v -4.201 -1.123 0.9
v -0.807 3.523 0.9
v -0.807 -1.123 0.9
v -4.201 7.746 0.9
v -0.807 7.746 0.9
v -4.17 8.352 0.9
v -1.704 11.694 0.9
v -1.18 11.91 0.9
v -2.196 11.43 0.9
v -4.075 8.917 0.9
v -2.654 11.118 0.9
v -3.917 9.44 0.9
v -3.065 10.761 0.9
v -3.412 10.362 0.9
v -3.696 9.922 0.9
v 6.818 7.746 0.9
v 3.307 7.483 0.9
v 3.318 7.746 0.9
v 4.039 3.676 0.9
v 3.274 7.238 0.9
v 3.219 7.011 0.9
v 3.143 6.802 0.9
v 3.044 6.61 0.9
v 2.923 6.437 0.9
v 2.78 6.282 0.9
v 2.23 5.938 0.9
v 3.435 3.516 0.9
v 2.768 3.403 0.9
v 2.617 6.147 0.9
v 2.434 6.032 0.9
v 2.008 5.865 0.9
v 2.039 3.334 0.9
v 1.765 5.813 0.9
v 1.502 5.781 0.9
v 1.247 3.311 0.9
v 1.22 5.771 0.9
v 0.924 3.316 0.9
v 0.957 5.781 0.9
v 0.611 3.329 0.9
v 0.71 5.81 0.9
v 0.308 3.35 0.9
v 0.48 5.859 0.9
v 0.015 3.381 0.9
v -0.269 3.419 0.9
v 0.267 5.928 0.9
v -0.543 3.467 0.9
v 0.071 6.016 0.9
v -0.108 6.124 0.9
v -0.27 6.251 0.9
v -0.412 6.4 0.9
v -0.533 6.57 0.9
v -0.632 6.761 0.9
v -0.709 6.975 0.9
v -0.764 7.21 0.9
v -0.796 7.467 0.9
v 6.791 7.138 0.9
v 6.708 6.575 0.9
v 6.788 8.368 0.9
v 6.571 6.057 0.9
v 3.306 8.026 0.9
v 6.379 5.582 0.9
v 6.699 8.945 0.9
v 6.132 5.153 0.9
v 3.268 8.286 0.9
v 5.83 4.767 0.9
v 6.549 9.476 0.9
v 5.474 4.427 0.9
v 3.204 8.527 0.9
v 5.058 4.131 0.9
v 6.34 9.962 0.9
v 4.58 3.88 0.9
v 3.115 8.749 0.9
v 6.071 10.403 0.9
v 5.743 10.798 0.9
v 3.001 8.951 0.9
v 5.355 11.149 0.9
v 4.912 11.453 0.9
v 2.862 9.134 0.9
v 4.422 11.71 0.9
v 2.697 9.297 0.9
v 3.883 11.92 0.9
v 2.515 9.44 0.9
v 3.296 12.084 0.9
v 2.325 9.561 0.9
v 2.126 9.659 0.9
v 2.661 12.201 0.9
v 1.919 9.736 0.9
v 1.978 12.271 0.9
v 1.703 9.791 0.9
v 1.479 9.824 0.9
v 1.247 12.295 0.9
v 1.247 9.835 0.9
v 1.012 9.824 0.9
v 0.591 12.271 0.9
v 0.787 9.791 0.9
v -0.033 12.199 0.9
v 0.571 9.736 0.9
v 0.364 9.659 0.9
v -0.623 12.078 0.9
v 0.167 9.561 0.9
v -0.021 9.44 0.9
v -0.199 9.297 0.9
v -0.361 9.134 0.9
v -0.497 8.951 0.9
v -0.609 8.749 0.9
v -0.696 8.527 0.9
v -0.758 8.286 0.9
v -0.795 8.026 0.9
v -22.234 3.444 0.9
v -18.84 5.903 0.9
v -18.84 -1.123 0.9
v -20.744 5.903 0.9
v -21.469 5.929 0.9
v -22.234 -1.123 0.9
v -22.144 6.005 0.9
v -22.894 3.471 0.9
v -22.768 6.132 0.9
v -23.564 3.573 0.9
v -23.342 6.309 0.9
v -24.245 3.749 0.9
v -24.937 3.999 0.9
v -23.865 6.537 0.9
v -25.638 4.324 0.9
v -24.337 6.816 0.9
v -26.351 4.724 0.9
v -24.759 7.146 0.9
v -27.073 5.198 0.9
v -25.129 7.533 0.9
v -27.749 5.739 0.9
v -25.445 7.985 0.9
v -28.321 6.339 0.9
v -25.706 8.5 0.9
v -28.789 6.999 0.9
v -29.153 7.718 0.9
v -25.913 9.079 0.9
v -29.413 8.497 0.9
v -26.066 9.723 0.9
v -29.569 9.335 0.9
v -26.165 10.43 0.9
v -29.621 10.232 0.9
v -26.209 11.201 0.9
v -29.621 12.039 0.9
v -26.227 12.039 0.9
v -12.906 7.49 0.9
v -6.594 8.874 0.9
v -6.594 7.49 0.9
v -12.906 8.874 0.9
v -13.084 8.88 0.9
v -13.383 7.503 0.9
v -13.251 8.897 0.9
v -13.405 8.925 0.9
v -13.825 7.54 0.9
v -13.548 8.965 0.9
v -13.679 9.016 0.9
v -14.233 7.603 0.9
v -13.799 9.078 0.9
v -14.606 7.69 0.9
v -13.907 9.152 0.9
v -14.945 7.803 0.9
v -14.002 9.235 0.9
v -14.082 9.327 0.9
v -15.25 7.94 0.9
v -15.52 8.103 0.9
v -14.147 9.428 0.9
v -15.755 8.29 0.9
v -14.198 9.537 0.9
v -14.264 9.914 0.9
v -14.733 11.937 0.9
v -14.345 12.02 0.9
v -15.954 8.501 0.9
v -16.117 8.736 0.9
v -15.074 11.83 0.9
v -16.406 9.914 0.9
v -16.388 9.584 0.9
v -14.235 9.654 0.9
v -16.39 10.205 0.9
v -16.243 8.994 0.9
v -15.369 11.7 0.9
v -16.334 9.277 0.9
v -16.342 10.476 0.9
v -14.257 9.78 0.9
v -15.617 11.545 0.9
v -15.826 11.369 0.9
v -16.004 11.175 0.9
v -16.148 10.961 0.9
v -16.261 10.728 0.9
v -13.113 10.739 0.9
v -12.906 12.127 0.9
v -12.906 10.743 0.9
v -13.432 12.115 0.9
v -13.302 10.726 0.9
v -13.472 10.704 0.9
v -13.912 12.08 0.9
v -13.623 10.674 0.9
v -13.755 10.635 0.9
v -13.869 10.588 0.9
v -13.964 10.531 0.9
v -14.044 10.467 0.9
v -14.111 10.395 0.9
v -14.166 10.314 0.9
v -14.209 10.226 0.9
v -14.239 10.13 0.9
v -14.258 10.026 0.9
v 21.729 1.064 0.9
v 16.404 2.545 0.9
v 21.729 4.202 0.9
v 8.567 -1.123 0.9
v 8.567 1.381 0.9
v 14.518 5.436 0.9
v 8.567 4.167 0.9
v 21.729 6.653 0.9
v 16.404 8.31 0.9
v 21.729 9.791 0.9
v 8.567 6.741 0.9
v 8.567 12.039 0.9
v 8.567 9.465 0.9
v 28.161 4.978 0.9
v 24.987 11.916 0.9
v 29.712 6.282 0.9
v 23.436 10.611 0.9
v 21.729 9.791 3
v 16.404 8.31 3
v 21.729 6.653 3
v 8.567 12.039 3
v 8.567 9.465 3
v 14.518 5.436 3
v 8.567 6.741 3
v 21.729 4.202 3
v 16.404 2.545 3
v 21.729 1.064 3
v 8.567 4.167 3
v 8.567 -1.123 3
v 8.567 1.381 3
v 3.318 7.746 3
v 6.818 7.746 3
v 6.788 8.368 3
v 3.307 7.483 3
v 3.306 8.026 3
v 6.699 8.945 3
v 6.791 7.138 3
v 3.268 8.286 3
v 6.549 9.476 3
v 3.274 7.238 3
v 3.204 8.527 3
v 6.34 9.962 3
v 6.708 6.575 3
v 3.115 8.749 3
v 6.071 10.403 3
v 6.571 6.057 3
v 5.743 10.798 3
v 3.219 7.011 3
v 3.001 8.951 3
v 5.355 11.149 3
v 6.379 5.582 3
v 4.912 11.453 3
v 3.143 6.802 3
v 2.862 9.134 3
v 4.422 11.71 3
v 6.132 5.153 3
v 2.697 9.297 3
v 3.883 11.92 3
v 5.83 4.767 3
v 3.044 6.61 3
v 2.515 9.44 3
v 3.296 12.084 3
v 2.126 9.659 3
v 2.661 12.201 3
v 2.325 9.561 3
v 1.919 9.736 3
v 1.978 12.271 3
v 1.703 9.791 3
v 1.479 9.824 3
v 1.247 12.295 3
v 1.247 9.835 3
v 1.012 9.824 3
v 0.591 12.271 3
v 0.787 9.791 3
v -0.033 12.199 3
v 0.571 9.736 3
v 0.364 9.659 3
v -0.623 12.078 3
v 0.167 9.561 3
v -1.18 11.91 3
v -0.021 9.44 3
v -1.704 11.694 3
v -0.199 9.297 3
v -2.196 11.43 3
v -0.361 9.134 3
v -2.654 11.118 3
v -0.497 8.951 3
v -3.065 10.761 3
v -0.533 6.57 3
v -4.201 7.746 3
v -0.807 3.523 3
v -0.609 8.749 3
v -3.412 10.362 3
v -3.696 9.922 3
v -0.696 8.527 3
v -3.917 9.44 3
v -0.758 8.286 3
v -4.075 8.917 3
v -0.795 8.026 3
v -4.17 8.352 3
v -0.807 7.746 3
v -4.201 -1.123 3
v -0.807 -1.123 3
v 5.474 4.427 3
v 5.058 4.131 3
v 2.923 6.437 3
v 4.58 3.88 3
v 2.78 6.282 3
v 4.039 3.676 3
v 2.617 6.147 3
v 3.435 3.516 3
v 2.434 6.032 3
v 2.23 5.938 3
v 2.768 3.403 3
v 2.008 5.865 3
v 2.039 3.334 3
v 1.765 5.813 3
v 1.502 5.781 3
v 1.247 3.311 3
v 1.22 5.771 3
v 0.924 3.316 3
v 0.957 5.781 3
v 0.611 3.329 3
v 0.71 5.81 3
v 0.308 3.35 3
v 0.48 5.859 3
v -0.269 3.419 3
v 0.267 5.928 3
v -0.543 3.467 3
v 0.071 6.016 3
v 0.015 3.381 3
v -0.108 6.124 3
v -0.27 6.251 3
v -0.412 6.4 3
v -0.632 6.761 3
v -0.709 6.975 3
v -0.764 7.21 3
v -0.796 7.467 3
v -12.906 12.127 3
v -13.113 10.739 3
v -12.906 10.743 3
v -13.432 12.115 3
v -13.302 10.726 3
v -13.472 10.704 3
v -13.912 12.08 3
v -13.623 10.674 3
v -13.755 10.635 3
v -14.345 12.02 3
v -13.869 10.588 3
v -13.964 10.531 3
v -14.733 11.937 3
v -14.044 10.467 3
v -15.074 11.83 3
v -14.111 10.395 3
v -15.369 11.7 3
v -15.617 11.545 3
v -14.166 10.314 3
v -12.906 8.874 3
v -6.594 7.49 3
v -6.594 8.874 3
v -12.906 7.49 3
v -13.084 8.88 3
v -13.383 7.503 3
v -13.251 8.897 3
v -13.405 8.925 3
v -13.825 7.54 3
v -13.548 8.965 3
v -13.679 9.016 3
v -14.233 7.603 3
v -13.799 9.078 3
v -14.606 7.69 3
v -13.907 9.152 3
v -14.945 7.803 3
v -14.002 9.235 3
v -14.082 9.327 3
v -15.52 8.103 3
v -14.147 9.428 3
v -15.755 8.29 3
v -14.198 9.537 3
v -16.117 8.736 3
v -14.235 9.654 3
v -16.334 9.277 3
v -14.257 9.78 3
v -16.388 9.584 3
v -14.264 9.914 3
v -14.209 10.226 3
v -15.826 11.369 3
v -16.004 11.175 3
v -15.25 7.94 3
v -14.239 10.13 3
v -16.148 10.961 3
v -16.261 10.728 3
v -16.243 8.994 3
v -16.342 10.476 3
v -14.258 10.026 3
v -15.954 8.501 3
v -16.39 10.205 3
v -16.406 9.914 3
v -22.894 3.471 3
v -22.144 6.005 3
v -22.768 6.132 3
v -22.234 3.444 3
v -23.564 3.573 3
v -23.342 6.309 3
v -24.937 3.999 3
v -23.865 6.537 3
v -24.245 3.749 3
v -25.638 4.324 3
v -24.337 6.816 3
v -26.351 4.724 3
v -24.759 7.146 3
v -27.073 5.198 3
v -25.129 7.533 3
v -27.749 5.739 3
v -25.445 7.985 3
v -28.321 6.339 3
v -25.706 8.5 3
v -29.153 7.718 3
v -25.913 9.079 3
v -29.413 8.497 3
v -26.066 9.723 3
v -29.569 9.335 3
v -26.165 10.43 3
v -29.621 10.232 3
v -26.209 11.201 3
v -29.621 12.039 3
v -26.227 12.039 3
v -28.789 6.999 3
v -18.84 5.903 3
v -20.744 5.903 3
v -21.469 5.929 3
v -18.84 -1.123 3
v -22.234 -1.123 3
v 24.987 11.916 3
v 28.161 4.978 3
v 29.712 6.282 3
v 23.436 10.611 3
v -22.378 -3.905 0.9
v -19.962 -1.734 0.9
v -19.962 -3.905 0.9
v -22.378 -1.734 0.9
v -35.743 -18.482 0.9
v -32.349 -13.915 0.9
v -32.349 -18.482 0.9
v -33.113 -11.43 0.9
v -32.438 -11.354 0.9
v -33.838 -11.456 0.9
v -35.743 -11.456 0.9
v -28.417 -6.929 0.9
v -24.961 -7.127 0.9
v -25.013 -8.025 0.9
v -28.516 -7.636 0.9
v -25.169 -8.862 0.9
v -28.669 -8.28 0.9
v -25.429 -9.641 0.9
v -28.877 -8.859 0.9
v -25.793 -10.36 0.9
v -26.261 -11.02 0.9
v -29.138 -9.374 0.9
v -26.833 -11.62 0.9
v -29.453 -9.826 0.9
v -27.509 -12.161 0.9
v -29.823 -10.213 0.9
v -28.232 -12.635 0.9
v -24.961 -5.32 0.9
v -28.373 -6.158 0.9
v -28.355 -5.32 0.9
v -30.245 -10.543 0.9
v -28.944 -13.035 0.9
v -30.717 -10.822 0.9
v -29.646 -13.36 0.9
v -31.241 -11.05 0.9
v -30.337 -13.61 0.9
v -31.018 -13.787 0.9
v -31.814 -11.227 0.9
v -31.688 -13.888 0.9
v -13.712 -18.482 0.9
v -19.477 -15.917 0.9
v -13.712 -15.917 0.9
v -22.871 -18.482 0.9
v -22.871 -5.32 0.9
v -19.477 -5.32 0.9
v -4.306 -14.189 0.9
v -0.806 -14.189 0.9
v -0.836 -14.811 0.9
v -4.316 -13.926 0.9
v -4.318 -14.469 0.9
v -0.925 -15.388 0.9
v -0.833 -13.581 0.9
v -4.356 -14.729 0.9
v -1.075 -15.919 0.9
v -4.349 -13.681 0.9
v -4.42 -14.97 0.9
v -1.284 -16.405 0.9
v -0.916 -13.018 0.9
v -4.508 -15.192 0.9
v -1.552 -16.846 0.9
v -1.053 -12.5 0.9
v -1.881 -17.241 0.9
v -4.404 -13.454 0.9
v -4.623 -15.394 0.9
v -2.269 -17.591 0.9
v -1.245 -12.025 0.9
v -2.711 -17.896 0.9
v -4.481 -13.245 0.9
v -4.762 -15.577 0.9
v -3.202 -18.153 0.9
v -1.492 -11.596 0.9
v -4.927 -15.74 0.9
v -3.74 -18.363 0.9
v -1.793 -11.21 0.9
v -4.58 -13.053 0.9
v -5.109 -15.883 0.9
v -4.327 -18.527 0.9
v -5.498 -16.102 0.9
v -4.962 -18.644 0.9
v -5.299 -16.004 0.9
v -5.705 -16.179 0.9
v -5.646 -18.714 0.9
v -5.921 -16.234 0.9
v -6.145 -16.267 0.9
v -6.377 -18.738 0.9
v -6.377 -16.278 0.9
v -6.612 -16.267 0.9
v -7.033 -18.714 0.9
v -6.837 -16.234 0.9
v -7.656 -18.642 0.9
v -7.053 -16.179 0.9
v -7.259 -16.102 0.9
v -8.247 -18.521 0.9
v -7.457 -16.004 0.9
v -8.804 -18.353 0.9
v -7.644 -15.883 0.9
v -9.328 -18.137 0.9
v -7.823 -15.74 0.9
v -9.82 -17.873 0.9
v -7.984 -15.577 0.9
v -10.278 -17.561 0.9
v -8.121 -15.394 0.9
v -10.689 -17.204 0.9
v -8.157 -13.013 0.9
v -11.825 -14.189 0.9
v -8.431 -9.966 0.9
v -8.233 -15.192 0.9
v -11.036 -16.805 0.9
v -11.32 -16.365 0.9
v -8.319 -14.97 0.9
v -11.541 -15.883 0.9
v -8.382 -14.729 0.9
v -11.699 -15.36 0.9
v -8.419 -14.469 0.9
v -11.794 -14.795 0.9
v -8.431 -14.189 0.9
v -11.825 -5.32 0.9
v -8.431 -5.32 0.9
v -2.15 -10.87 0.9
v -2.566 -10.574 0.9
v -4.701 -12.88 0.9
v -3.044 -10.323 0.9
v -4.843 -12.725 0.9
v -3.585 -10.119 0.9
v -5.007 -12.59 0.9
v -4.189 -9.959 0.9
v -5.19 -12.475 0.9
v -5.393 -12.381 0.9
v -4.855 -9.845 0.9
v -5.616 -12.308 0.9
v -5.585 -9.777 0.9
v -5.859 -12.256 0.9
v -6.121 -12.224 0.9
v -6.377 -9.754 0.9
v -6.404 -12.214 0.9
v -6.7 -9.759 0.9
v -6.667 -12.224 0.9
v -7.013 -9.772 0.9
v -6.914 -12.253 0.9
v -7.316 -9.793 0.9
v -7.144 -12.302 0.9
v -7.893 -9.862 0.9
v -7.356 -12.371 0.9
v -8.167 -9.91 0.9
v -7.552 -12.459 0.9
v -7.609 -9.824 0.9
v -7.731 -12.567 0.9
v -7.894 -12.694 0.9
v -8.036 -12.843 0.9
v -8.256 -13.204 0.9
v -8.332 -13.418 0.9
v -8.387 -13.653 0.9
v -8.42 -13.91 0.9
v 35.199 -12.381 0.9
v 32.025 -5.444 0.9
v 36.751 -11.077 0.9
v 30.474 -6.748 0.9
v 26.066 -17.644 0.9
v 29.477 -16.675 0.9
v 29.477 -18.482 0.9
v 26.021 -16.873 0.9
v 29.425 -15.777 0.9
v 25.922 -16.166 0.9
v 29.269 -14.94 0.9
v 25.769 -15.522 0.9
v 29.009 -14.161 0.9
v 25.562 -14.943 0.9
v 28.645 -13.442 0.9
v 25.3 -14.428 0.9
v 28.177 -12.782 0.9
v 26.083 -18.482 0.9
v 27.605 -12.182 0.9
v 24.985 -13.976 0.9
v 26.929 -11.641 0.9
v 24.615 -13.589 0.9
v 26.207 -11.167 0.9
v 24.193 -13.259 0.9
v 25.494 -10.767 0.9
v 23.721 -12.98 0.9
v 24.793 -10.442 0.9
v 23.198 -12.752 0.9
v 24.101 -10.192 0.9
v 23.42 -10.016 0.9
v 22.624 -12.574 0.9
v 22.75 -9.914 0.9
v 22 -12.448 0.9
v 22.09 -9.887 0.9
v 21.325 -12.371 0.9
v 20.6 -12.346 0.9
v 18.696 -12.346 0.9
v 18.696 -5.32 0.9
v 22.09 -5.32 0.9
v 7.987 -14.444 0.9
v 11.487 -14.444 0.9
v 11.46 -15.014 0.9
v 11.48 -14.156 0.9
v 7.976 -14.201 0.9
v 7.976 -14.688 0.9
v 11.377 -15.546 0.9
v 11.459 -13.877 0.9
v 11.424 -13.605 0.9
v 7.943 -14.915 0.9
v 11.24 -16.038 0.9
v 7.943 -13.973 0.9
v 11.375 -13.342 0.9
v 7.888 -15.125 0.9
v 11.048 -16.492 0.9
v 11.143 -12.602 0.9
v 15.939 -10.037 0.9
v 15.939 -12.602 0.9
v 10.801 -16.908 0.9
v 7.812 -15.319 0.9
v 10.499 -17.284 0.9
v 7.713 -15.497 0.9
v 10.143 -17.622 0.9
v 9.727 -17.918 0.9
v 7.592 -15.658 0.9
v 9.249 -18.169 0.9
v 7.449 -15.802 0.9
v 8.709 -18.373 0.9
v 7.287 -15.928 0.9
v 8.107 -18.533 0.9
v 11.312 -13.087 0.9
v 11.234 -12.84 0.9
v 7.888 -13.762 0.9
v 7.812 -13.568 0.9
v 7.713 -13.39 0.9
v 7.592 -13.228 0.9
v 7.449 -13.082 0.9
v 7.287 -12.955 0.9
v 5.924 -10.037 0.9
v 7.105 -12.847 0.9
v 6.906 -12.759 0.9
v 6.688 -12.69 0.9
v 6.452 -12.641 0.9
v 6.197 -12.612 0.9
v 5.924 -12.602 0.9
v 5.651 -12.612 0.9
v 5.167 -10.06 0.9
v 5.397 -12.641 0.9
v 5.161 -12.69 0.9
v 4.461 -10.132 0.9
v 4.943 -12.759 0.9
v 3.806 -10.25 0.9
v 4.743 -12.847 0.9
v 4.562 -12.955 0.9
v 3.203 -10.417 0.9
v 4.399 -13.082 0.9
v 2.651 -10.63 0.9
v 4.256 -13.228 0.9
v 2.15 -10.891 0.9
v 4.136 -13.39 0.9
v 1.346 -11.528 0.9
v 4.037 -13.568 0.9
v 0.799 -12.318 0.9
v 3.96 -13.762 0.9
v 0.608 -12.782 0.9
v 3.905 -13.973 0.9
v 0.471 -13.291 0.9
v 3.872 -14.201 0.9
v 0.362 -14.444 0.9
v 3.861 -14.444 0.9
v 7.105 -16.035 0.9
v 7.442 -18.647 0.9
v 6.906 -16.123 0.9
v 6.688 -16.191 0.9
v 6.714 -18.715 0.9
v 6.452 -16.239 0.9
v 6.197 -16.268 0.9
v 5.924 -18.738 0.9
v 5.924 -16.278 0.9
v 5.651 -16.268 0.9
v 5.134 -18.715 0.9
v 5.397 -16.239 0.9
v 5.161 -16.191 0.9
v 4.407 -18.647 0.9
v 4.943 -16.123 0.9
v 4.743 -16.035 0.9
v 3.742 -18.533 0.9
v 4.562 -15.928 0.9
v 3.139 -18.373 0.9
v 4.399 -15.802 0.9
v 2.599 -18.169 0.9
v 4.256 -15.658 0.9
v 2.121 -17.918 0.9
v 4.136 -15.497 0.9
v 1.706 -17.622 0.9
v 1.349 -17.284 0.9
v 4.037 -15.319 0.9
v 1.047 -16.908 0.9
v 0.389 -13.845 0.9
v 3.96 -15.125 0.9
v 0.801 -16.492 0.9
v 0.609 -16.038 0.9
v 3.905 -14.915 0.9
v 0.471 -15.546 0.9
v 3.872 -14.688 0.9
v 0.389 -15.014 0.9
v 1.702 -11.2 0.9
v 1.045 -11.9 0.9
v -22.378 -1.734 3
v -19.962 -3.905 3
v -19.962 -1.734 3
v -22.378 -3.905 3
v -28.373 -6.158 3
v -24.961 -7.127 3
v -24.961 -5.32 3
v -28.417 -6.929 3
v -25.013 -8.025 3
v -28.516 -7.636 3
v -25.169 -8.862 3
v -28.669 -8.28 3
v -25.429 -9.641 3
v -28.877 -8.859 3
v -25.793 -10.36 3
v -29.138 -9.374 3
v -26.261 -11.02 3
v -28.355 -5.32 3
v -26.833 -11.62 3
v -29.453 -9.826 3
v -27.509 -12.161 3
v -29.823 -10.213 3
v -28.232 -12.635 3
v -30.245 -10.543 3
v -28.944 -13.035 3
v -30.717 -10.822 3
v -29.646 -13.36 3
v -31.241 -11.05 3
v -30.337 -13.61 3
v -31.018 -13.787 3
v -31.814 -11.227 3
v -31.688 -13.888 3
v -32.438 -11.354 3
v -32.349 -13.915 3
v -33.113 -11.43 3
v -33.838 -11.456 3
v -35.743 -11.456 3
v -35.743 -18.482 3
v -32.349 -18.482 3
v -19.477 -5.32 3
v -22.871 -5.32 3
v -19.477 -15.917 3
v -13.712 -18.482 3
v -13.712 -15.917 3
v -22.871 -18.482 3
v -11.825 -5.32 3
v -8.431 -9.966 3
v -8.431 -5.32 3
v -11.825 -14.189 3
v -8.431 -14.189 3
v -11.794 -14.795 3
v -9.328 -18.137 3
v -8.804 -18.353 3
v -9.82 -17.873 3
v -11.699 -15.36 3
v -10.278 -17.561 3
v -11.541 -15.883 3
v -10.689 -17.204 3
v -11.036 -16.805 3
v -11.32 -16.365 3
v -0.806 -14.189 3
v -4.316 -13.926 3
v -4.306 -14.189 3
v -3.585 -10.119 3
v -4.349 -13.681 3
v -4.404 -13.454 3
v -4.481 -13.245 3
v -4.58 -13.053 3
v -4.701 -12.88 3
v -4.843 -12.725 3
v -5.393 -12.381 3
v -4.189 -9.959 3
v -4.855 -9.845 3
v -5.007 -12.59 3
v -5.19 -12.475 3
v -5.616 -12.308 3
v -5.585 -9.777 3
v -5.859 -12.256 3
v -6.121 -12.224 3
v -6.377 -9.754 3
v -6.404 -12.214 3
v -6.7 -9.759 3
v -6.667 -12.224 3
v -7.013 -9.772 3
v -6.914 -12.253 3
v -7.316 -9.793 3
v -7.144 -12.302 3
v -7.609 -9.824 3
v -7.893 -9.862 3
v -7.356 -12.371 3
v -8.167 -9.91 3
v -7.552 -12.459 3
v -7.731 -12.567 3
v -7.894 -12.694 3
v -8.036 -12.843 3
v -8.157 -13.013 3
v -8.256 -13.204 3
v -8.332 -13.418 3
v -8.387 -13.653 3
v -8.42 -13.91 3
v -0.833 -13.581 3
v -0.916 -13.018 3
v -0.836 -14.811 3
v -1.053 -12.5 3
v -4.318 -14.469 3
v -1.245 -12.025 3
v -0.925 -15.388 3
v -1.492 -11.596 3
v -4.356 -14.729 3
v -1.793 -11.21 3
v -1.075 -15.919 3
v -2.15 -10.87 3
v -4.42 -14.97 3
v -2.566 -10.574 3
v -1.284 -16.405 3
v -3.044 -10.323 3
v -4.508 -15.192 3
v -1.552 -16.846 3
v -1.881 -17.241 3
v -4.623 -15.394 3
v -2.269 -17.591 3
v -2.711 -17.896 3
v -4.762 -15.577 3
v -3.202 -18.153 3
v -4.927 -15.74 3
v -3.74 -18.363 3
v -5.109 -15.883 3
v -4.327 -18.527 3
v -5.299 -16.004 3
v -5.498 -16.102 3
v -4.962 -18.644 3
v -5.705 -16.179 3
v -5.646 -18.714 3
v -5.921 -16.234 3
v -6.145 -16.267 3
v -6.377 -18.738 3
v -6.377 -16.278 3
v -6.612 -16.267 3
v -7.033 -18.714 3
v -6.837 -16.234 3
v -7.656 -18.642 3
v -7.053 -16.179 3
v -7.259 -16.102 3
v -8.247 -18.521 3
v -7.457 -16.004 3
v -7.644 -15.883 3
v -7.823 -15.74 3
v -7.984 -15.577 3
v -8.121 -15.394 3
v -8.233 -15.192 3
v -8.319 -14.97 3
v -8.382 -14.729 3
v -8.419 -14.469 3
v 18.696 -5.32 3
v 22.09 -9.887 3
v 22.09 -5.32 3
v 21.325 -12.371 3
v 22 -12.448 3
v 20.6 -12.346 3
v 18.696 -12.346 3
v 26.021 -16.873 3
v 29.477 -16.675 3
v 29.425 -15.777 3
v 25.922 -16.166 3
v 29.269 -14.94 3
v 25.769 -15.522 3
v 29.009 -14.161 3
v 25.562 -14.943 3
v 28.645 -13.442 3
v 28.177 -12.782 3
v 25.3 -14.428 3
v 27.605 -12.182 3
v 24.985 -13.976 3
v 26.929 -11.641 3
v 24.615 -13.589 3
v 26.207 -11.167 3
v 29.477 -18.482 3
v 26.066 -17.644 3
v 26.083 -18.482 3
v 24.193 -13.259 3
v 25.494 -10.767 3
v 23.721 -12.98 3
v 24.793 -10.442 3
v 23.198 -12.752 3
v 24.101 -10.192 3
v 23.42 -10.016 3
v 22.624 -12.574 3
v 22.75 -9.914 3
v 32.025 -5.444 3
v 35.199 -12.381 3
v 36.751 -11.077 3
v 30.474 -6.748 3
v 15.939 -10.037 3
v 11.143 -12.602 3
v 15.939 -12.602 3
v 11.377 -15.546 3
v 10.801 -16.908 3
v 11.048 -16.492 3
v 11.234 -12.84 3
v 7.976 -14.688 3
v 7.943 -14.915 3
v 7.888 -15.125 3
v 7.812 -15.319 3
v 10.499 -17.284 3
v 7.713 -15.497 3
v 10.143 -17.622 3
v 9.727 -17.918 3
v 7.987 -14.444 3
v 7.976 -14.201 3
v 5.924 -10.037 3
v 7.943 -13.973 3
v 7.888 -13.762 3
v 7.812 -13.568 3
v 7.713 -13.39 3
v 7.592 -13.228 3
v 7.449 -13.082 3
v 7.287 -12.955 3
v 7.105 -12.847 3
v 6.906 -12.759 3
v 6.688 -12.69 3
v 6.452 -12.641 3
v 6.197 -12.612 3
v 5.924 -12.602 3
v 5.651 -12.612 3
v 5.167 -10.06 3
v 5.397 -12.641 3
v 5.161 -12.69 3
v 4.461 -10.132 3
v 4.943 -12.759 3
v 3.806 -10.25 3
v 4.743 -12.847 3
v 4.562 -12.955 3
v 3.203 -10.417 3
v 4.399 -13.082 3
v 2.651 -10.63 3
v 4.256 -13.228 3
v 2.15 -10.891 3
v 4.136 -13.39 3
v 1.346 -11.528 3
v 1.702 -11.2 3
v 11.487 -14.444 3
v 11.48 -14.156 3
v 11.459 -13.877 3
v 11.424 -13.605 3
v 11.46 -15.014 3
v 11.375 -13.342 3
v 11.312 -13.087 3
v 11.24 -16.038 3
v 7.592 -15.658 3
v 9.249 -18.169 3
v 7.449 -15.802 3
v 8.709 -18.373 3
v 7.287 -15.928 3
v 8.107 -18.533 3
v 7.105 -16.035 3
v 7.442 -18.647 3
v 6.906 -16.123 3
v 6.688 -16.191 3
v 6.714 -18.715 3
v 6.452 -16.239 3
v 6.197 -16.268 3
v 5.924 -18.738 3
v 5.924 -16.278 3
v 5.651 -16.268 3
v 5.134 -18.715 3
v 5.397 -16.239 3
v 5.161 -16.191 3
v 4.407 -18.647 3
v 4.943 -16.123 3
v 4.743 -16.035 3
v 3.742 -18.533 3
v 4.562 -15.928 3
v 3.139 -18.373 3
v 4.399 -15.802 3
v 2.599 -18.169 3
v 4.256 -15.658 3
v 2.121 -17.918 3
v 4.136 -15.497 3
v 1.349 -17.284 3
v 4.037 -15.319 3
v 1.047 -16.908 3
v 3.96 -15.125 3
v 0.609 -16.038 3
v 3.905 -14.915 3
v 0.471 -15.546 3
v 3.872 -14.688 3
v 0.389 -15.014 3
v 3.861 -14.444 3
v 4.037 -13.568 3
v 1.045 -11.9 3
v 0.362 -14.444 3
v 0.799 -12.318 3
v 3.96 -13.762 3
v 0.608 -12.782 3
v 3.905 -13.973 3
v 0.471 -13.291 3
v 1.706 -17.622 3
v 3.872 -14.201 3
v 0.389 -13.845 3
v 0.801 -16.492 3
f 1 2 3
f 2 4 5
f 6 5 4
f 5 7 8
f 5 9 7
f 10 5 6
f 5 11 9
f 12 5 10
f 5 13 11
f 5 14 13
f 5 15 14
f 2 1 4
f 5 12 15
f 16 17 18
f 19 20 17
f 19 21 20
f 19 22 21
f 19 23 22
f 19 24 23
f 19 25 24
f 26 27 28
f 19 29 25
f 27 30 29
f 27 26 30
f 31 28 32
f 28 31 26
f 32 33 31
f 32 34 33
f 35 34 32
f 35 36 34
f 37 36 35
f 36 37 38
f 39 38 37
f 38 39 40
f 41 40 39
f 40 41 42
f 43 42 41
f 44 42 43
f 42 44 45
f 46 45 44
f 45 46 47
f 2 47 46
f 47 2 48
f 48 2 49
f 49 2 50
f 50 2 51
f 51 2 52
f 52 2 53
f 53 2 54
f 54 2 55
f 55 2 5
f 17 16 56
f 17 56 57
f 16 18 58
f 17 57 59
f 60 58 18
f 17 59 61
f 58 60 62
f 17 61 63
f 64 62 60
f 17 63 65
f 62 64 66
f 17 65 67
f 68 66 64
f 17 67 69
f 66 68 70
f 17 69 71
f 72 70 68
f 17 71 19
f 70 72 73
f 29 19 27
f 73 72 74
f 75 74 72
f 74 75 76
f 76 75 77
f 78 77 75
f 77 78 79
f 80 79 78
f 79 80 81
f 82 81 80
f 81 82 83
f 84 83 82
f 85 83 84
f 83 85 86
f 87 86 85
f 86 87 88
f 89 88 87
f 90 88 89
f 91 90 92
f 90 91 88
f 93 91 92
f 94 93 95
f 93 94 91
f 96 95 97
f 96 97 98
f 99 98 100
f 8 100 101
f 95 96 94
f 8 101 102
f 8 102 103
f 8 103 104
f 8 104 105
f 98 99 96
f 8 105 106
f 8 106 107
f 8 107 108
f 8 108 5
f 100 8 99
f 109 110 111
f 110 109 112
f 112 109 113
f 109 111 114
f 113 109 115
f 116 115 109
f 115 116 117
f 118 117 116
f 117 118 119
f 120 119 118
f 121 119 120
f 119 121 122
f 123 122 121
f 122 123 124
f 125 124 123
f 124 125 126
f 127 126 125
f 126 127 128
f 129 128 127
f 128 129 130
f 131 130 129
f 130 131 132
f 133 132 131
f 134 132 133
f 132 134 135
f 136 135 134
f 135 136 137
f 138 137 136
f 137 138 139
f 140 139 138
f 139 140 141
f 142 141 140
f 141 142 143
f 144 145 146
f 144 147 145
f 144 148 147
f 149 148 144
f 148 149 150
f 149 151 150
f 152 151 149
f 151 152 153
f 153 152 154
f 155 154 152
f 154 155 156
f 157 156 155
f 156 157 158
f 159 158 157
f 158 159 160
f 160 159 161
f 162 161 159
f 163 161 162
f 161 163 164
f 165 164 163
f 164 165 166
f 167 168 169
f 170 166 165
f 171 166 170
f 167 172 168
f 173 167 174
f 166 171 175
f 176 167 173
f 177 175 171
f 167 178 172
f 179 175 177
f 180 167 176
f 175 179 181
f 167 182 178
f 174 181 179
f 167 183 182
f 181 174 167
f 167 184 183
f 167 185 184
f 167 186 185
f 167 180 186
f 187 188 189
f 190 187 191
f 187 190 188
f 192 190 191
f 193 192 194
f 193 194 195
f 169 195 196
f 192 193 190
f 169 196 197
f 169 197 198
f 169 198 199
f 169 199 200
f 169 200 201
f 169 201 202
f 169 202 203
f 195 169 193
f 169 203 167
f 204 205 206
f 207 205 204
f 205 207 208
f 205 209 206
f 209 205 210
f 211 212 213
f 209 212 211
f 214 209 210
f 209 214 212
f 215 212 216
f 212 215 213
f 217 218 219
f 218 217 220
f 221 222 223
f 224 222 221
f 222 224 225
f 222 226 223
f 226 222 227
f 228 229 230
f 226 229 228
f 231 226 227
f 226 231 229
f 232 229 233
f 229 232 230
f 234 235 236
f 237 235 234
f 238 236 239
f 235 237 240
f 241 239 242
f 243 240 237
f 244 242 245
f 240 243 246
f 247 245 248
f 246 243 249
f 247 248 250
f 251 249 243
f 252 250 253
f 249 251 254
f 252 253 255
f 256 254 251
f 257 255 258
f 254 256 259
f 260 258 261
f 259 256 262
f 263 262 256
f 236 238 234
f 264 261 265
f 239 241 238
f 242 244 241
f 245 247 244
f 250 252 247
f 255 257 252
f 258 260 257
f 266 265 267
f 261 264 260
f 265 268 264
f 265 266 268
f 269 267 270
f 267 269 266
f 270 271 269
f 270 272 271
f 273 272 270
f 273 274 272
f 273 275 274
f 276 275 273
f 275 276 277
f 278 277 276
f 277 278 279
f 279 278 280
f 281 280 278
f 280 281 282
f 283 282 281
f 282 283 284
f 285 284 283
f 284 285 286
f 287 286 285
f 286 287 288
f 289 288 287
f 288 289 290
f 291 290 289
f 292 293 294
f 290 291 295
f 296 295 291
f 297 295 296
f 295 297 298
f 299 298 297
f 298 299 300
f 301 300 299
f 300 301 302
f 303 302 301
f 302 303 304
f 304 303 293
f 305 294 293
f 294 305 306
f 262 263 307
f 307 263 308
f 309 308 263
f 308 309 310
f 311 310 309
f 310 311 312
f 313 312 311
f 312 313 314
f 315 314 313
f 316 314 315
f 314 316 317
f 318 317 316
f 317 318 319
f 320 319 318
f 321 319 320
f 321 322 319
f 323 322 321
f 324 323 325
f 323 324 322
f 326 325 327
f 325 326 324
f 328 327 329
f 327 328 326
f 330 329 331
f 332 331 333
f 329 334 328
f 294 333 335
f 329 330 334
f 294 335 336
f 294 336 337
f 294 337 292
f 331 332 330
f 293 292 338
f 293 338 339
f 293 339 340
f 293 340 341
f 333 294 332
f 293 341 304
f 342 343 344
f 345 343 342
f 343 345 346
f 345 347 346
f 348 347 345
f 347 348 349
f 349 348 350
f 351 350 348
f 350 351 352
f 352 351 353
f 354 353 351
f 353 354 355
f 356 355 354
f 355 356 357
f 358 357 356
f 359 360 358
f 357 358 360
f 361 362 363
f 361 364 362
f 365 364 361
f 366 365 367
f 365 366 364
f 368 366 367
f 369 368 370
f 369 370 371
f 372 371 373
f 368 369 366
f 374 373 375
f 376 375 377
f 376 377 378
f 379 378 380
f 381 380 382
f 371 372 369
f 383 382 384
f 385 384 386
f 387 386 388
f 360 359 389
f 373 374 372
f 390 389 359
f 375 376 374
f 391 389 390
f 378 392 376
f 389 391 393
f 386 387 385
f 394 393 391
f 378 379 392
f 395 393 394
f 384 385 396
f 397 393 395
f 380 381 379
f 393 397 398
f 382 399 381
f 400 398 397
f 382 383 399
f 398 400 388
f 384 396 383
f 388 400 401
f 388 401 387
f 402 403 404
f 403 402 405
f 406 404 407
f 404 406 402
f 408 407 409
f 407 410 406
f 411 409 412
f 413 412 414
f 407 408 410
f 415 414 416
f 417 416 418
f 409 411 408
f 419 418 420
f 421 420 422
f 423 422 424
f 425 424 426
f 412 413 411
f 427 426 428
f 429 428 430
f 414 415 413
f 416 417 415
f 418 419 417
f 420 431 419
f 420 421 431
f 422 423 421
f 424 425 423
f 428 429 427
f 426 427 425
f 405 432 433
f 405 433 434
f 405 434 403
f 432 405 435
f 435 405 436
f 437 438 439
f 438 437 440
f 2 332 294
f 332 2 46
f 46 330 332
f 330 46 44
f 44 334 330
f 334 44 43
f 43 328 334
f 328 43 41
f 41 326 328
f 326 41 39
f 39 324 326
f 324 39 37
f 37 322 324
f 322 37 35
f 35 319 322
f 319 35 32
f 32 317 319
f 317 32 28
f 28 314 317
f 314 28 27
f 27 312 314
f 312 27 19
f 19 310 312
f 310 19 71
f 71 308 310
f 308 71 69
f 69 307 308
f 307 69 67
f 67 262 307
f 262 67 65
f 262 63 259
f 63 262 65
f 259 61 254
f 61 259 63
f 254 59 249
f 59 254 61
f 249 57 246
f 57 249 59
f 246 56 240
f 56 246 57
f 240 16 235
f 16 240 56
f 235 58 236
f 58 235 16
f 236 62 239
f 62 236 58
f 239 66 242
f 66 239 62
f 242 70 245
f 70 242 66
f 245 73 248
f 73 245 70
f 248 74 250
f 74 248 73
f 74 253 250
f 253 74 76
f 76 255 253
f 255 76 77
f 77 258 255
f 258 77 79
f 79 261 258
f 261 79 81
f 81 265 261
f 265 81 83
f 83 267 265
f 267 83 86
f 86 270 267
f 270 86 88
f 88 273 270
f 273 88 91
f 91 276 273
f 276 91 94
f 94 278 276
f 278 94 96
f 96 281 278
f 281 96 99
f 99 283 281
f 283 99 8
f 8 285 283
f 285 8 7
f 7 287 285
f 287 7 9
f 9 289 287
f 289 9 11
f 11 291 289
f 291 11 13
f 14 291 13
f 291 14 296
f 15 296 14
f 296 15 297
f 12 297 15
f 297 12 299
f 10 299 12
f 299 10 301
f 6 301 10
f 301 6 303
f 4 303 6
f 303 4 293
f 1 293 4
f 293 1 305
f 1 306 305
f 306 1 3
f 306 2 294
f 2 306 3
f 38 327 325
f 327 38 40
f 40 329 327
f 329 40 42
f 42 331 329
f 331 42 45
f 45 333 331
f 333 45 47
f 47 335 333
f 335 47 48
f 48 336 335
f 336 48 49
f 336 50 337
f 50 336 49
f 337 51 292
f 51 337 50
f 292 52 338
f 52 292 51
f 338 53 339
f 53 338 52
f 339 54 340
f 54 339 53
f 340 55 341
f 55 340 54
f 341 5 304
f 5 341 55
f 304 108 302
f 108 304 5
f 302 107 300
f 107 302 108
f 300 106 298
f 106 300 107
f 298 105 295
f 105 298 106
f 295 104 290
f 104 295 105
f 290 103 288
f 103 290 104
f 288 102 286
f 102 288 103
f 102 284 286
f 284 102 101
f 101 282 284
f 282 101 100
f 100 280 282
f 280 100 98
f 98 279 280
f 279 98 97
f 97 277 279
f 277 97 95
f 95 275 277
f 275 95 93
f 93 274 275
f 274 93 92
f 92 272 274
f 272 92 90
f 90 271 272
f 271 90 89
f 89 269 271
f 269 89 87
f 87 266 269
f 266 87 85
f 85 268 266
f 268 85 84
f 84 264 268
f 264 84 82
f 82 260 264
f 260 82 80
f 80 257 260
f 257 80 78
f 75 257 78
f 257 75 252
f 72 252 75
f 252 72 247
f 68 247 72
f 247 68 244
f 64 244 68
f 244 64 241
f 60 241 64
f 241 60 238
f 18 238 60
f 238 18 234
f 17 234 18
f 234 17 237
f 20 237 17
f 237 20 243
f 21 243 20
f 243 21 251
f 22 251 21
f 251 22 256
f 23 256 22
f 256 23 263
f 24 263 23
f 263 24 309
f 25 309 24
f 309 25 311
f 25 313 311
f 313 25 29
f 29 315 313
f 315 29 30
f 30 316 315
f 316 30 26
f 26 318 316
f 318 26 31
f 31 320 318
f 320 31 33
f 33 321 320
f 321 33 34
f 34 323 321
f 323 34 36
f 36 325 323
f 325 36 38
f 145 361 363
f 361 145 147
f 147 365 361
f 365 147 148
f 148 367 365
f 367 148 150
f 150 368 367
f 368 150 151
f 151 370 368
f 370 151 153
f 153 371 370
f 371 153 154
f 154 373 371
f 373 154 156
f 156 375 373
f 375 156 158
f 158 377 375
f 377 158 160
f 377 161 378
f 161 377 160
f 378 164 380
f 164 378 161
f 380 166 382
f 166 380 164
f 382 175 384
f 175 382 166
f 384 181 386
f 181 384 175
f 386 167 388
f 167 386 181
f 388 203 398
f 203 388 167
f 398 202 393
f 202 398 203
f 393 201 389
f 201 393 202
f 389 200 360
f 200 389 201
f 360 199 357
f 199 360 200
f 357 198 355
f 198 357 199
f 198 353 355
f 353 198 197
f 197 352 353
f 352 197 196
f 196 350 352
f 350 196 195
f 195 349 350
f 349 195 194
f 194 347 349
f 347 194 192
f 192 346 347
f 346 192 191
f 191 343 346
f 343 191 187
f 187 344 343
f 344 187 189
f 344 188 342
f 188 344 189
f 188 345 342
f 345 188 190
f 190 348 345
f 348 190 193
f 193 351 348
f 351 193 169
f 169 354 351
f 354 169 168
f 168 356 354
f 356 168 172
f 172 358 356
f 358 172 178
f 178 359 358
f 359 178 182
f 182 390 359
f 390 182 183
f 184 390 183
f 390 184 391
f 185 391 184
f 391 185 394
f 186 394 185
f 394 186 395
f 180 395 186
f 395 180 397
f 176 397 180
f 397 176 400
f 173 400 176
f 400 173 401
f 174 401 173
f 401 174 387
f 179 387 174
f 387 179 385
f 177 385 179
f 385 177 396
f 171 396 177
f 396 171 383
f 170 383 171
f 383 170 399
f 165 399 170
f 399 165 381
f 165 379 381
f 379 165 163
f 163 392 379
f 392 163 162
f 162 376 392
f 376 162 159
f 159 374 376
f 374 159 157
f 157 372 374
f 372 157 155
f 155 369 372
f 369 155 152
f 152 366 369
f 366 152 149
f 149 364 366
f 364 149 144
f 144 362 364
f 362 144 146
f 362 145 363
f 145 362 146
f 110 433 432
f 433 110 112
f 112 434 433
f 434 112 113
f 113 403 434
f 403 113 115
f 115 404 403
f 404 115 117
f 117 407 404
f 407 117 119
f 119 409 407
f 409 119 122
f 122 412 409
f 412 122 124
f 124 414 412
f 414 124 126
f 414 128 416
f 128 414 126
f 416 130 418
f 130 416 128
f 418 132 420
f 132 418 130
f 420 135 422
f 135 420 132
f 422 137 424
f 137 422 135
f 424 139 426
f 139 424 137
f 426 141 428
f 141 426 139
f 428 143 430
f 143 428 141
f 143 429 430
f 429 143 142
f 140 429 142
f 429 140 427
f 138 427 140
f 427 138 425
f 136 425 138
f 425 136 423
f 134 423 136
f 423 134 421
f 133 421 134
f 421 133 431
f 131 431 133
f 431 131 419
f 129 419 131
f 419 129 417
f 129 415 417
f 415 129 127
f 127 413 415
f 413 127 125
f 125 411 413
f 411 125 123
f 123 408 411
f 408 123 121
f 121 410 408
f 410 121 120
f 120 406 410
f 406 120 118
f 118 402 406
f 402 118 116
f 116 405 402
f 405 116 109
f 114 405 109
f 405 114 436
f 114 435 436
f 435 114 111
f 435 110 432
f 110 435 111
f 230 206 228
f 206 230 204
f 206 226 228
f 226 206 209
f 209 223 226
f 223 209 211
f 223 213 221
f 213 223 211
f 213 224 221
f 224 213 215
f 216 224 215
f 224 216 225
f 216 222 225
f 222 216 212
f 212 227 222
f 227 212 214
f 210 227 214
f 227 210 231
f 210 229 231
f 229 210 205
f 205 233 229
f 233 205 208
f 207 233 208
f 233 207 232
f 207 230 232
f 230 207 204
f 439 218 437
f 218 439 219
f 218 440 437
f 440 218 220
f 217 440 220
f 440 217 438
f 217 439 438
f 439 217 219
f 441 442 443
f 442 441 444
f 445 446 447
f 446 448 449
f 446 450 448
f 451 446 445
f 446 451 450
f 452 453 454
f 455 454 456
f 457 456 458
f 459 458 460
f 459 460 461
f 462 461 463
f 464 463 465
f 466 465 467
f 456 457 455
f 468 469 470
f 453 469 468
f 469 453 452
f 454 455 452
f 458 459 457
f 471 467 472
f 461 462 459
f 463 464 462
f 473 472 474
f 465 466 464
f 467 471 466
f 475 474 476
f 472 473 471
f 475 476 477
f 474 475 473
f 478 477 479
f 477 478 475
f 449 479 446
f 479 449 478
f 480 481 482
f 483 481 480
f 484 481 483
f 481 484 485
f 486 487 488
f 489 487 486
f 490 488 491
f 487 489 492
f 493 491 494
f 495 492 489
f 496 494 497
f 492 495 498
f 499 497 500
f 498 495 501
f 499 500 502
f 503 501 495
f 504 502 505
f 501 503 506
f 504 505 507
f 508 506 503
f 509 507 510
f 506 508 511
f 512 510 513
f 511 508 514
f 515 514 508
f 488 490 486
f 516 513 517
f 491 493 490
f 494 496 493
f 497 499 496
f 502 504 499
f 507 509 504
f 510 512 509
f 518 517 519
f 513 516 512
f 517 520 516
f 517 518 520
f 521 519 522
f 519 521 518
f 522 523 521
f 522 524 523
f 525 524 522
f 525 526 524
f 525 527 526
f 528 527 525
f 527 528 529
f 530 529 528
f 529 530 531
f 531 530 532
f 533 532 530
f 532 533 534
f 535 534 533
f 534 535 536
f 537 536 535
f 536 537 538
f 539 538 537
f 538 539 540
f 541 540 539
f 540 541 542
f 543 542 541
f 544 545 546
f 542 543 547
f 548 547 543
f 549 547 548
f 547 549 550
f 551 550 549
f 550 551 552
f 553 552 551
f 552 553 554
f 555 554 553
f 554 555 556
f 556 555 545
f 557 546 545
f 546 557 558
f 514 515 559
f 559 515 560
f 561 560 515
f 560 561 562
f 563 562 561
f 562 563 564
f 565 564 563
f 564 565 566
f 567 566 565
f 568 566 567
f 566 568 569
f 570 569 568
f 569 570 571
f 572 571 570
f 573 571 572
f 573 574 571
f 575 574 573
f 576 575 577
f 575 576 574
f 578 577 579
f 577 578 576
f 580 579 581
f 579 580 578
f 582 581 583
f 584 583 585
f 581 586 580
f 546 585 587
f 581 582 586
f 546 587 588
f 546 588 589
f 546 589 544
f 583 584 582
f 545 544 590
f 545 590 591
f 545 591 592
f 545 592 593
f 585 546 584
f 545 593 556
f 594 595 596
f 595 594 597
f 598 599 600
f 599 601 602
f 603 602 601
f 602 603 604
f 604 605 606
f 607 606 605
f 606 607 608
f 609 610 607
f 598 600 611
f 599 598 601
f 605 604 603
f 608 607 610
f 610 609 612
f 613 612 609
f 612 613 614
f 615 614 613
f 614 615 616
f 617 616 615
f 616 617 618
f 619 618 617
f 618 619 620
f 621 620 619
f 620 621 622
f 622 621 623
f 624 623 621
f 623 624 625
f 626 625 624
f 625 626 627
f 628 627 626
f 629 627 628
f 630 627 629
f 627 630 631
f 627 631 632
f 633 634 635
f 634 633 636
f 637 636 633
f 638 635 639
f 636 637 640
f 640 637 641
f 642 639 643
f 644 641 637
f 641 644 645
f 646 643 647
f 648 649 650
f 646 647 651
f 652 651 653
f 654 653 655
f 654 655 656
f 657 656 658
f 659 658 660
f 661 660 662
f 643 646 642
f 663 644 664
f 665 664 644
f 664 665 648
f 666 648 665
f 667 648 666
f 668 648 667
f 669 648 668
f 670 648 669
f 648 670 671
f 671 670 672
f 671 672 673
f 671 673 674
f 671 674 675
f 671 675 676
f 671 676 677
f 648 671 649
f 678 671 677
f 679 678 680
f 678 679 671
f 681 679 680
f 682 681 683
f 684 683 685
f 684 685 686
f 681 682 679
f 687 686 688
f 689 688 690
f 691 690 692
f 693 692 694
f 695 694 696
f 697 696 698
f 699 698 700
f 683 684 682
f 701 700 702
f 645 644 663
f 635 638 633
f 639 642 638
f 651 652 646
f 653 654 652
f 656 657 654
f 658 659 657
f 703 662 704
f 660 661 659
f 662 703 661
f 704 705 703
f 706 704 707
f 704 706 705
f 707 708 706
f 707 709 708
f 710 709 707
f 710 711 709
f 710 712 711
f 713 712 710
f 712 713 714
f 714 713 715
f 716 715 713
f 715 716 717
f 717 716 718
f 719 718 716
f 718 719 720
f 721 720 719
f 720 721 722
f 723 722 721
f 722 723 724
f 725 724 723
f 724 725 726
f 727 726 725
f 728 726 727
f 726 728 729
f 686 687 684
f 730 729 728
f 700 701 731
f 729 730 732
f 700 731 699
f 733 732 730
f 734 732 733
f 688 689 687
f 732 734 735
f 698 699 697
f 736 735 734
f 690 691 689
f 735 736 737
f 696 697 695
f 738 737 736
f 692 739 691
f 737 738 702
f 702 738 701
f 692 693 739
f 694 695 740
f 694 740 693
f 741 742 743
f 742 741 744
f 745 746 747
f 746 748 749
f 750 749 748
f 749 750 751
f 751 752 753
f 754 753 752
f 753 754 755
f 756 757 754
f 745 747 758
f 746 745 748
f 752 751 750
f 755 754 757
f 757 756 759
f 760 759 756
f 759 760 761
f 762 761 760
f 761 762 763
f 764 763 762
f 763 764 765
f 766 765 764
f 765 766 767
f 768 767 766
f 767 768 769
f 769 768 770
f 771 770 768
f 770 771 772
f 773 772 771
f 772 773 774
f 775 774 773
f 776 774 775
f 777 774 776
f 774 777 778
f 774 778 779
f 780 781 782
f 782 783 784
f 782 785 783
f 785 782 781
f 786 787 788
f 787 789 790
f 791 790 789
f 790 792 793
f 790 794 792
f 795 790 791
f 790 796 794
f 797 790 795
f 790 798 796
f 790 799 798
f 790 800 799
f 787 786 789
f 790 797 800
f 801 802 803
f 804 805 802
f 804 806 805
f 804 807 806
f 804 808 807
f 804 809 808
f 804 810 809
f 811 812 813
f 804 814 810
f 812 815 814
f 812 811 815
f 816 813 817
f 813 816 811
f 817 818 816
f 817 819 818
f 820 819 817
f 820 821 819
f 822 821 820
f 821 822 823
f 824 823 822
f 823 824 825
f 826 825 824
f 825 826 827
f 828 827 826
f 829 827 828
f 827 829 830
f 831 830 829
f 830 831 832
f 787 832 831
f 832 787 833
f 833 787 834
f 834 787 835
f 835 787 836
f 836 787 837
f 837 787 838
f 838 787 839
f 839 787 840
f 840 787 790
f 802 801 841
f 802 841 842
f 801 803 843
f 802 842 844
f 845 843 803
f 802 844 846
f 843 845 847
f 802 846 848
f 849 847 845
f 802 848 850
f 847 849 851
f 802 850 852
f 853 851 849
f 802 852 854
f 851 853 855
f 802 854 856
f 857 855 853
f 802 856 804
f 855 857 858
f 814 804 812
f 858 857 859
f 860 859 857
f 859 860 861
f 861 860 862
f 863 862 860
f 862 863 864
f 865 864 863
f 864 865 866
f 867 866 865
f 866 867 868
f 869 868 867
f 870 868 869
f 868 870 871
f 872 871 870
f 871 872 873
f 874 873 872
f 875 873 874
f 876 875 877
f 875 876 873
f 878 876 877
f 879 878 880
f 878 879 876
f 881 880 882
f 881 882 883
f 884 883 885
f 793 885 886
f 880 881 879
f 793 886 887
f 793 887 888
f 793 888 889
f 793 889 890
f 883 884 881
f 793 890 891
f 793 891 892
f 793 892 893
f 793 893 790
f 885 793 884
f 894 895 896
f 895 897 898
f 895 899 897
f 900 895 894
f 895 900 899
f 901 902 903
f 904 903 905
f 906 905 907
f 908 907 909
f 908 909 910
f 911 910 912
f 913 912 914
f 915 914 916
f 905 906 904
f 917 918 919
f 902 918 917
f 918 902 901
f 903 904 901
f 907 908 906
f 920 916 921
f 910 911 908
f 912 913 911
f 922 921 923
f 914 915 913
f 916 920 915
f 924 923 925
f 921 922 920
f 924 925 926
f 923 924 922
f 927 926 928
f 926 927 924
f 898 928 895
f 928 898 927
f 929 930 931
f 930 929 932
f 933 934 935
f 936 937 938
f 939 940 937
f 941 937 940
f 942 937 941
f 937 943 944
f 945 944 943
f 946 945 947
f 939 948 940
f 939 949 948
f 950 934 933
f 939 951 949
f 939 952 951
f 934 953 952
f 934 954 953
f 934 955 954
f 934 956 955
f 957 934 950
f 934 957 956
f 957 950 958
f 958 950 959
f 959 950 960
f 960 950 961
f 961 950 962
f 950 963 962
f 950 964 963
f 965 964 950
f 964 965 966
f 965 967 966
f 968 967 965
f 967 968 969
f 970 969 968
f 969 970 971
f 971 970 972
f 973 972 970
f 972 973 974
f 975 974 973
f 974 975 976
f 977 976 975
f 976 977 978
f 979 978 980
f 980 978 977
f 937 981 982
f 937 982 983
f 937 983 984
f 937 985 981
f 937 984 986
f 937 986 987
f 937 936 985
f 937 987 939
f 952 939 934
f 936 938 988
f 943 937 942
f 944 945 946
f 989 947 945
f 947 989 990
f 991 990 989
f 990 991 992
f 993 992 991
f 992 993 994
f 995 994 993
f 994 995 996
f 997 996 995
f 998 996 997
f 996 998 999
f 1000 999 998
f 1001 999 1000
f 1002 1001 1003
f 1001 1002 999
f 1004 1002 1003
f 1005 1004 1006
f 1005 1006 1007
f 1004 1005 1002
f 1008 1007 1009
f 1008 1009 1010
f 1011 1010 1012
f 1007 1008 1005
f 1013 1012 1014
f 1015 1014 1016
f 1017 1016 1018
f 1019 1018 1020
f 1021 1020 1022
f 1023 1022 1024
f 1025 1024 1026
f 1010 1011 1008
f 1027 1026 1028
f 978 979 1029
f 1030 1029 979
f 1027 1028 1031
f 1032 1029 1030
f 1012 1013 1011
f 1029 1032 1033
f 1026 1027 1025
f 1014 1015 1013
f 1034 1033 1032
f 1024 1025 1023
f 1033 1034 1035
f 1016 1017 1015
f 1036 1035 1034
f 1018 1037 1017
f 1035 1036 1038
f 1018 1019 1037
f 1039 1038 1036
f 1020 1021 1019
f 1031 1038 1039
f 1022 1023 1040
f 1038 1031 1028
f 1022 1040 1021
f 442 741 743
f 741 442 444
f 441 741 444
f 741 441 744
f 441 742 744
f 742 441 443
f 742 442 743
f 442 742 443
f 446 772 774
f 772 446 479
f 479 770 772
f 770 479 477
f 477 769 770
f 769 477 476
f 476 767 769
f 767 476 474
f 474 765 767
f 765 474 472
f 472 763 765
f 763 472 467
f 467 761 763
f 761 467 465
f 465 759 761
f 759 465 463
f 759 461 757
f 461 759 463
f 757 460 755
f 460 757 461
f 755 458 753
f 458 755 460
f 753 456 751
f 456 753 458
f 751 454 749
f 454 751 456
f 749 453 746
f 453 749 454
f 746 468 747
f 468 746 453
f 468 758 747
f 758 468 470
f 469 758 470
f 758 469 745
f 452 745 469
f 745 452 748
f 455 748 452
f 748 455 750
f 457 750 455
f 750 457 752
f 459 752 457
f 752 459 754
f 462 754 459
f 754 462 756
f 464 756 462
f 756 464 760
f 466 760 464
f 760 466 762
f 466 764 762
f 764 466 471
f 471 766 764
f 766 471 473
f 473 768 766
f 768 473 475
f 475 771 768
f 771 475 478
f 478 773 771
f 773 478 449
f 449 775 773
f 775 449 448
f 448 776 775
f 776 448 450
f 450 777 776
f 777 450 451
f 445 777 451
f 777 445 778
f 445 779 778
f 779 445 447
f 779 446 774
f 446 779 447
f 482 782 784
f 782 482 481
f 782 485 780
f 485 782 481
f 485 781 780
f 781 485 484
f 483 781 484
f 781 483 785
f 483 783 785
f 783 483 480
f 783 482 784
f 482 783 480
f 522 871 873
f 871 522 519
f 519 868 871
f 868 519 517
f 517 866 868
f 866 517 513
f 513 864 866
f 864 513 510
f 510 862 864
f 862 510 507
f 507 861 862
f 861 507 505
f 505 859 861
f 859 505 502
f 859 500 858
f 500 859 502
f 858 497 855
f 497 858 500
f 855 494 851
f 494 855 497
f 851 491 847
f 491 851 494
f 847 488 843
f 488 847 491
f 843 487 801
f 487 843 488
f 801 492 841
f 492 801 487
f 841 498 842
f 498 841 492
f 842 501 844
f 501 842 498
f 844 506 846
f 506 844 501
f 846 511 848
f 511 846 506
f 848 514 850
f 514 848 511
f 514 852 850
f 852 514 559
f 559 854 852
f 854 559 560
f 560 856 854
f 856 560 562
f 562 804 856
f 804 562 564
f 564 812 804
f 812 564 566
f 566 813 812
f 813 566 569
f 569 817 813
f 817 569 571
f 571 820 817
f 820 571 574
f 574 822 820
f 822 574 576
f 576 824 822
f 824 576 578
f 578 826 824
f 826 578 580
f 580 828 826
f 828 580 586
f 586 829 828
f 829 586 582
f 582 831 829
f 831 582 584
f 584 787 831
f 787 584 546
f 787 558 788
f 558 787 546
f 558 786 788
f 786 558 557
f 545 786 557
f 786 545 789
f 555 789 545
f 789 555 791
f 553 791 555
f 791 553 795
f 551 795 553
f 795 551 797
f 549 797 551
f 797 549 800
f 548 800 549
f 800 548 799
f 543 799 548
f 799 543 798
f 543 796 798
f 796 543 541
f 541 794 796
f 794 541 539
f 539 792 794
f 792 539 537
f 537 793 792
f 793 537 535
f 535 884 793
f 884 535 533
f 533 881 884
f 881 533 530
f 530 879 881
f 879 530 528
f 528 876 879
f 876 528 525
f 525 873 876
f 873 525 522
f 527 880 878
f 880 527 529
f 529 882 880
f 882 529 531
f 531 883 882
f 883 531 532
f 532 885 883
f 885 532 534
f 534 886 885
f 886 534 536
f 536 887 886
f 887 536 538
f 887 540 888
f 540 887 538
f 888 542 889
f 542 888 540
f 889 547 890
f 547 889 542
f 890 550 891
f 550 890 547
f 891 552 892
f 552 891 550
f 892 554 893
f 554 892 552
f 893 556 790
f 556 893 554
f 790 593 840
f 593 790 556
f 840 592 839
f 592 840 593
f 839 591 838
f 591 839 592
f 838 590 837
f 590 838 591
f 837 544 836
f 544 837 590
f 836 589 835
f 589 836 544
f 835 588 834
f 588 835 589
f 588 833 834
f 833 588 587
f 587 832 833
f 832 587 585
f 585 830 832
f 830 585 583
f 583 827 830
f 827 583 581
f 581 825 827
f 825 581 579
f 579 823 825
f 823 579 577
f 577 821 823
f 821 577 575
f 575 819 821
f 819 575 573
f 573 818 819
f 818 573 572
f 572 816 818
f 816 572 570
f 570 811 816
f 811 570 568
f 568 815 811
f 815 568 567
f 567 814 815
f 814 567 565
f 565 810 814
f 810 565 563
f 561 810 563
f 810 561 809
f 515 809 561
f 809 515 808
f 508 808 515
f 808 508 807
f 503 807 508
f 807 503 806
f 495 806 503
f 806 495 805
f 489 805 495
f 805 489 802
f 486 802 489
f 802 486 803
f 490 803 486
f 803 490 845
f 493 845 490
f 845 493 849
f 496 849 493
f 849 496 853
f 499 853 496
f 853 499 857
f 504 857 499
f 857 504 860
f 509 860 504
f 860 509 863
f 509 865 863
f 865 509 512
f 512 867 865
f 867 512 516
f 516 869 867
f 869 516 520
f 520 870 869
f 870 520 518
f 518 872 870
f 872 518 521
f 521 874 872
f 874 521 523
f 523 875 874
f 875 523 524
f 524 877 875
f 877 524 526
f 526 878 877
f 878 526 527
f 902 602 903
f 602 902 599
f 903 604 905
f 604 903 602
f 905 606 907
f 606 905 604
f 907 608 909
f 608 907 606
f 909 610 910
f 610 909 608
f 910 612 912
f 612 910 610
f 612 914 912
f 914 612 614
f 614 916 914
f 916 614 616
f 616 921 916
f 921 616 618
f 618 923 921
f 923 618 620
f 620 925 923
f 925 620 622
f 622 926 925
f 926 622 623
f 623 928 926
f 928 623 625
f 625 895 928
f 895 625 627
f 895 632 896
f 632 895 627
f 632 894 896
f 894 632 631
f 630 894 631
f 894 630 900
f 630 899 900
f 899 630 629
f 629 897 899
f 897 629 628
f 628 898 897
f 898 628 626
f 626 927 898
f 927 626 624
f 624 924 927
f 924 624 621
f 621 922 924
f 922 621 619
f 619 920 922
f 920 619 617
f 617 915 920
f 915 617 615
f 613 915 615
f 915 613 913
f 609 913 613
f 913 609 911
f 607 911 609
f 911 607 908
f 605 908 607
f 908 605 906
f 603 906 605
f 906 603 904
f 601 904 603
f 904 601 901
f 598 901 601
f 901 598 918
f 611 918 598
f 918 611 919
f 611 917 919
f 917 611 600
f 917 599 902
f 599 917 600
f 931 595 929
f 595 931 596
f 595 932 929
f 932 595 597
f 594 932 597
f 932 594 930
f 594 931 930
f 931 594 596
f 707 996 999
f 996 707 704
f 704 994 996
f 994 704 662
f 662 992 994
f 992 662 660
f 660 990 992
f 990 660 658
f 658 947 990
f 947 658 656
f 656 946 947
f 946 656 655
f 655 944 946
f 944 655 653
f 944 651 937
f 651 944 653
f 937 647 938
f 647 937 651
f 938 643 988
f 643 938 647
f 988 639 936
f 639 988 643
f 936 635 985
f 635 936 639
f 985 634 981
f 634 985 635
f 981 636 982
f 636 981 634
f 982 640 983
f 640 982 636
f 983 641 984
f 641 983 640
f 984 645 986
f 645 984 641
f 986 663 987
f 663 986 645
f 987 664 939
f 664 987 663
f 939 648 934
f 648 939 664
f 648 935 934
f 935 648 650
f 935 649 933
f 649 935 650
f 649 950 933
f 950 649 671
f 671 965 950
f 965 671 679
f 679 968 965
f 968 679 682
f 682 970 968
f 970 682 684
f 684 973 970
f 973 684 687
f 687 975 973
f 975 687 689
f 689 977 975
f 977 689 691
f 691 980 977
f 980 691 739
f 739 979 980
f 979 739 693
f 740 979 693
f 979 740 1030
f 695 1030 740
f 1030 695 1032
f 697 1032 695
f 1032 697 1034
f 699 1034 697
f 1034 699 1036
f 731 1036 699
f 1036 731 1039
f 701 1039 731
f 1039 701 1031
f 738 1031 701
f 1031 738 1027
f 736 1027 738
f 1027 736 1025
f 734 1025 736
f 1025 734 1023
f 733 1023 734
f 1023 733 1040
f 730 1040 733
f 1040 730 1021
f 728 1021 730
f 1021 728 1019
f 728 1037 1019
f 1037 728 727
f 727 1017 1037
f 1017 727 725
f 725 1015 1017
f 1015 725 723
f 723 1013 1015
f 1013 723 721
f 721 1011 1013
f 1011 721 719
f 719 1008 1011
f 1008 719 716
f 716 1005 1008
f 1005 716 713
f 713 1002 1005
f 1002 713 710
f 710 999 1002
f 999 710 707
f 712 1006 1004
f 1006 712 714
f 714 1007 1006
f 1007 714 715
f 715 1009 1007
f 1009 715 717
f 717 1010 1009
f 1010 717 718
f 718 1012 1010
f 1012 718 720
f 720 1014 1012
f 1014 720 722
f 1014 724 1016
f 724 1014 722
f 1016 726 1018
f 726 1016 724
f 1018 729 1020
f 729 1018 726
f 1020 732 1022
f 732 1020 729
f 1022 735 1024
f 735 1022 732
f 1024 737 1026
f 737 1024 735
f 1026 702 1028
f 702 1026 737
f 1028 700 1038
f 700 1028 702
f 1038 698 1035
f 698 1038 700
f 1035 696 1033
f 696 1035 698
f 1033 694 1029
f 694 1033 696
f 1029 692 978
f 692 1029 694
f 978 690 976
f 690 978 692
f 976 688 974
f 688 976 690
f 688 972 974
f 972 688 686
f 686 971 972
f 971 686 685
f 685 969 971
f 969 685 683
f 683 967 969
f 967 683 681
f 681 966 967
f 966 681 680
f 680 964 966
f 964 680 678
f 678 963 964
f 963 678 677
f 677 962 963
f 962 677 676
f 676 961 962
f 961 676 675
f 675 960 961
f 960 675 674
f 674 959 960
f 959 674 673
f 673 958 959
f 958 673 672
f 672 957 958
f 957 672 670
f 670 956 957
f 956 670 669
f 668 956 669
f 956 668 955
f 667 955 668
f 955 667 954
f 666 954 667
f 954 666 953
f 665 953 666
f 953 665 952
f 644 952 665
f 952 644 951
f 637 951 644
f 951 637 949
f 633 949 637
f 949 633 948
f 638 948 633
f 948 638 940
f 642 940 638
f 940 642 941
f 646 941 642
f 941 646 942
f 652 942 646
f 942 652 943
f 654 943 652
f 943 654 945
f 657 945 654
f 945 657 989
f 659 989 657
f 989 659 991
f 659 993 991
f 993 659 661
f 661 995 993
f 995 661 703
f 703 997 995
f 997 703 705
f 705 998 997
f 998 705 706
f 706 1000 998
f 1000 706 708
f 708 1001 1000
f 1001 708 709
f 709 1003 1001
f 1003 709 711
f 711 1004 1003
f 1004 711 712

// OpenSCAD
$fn = 48;
  // syllabics (overlaid on icon, tallest)
  translate([0, 5.430, 0.900]) linear_extrude(height=2.100) text("ᓭᓪᑭᕒᐠ", size=13.000, halign="center", valign="center", font="Euphemia UCAS:style=Bold");
  translate([0, -10.430, 0.900]) linear_extrude(height=2.100) text("ᓯᒫᑲᓂᓴᐠ", size=13.000, halign="center", valign="center", font="Euphemia UCAS:style=Bold");
